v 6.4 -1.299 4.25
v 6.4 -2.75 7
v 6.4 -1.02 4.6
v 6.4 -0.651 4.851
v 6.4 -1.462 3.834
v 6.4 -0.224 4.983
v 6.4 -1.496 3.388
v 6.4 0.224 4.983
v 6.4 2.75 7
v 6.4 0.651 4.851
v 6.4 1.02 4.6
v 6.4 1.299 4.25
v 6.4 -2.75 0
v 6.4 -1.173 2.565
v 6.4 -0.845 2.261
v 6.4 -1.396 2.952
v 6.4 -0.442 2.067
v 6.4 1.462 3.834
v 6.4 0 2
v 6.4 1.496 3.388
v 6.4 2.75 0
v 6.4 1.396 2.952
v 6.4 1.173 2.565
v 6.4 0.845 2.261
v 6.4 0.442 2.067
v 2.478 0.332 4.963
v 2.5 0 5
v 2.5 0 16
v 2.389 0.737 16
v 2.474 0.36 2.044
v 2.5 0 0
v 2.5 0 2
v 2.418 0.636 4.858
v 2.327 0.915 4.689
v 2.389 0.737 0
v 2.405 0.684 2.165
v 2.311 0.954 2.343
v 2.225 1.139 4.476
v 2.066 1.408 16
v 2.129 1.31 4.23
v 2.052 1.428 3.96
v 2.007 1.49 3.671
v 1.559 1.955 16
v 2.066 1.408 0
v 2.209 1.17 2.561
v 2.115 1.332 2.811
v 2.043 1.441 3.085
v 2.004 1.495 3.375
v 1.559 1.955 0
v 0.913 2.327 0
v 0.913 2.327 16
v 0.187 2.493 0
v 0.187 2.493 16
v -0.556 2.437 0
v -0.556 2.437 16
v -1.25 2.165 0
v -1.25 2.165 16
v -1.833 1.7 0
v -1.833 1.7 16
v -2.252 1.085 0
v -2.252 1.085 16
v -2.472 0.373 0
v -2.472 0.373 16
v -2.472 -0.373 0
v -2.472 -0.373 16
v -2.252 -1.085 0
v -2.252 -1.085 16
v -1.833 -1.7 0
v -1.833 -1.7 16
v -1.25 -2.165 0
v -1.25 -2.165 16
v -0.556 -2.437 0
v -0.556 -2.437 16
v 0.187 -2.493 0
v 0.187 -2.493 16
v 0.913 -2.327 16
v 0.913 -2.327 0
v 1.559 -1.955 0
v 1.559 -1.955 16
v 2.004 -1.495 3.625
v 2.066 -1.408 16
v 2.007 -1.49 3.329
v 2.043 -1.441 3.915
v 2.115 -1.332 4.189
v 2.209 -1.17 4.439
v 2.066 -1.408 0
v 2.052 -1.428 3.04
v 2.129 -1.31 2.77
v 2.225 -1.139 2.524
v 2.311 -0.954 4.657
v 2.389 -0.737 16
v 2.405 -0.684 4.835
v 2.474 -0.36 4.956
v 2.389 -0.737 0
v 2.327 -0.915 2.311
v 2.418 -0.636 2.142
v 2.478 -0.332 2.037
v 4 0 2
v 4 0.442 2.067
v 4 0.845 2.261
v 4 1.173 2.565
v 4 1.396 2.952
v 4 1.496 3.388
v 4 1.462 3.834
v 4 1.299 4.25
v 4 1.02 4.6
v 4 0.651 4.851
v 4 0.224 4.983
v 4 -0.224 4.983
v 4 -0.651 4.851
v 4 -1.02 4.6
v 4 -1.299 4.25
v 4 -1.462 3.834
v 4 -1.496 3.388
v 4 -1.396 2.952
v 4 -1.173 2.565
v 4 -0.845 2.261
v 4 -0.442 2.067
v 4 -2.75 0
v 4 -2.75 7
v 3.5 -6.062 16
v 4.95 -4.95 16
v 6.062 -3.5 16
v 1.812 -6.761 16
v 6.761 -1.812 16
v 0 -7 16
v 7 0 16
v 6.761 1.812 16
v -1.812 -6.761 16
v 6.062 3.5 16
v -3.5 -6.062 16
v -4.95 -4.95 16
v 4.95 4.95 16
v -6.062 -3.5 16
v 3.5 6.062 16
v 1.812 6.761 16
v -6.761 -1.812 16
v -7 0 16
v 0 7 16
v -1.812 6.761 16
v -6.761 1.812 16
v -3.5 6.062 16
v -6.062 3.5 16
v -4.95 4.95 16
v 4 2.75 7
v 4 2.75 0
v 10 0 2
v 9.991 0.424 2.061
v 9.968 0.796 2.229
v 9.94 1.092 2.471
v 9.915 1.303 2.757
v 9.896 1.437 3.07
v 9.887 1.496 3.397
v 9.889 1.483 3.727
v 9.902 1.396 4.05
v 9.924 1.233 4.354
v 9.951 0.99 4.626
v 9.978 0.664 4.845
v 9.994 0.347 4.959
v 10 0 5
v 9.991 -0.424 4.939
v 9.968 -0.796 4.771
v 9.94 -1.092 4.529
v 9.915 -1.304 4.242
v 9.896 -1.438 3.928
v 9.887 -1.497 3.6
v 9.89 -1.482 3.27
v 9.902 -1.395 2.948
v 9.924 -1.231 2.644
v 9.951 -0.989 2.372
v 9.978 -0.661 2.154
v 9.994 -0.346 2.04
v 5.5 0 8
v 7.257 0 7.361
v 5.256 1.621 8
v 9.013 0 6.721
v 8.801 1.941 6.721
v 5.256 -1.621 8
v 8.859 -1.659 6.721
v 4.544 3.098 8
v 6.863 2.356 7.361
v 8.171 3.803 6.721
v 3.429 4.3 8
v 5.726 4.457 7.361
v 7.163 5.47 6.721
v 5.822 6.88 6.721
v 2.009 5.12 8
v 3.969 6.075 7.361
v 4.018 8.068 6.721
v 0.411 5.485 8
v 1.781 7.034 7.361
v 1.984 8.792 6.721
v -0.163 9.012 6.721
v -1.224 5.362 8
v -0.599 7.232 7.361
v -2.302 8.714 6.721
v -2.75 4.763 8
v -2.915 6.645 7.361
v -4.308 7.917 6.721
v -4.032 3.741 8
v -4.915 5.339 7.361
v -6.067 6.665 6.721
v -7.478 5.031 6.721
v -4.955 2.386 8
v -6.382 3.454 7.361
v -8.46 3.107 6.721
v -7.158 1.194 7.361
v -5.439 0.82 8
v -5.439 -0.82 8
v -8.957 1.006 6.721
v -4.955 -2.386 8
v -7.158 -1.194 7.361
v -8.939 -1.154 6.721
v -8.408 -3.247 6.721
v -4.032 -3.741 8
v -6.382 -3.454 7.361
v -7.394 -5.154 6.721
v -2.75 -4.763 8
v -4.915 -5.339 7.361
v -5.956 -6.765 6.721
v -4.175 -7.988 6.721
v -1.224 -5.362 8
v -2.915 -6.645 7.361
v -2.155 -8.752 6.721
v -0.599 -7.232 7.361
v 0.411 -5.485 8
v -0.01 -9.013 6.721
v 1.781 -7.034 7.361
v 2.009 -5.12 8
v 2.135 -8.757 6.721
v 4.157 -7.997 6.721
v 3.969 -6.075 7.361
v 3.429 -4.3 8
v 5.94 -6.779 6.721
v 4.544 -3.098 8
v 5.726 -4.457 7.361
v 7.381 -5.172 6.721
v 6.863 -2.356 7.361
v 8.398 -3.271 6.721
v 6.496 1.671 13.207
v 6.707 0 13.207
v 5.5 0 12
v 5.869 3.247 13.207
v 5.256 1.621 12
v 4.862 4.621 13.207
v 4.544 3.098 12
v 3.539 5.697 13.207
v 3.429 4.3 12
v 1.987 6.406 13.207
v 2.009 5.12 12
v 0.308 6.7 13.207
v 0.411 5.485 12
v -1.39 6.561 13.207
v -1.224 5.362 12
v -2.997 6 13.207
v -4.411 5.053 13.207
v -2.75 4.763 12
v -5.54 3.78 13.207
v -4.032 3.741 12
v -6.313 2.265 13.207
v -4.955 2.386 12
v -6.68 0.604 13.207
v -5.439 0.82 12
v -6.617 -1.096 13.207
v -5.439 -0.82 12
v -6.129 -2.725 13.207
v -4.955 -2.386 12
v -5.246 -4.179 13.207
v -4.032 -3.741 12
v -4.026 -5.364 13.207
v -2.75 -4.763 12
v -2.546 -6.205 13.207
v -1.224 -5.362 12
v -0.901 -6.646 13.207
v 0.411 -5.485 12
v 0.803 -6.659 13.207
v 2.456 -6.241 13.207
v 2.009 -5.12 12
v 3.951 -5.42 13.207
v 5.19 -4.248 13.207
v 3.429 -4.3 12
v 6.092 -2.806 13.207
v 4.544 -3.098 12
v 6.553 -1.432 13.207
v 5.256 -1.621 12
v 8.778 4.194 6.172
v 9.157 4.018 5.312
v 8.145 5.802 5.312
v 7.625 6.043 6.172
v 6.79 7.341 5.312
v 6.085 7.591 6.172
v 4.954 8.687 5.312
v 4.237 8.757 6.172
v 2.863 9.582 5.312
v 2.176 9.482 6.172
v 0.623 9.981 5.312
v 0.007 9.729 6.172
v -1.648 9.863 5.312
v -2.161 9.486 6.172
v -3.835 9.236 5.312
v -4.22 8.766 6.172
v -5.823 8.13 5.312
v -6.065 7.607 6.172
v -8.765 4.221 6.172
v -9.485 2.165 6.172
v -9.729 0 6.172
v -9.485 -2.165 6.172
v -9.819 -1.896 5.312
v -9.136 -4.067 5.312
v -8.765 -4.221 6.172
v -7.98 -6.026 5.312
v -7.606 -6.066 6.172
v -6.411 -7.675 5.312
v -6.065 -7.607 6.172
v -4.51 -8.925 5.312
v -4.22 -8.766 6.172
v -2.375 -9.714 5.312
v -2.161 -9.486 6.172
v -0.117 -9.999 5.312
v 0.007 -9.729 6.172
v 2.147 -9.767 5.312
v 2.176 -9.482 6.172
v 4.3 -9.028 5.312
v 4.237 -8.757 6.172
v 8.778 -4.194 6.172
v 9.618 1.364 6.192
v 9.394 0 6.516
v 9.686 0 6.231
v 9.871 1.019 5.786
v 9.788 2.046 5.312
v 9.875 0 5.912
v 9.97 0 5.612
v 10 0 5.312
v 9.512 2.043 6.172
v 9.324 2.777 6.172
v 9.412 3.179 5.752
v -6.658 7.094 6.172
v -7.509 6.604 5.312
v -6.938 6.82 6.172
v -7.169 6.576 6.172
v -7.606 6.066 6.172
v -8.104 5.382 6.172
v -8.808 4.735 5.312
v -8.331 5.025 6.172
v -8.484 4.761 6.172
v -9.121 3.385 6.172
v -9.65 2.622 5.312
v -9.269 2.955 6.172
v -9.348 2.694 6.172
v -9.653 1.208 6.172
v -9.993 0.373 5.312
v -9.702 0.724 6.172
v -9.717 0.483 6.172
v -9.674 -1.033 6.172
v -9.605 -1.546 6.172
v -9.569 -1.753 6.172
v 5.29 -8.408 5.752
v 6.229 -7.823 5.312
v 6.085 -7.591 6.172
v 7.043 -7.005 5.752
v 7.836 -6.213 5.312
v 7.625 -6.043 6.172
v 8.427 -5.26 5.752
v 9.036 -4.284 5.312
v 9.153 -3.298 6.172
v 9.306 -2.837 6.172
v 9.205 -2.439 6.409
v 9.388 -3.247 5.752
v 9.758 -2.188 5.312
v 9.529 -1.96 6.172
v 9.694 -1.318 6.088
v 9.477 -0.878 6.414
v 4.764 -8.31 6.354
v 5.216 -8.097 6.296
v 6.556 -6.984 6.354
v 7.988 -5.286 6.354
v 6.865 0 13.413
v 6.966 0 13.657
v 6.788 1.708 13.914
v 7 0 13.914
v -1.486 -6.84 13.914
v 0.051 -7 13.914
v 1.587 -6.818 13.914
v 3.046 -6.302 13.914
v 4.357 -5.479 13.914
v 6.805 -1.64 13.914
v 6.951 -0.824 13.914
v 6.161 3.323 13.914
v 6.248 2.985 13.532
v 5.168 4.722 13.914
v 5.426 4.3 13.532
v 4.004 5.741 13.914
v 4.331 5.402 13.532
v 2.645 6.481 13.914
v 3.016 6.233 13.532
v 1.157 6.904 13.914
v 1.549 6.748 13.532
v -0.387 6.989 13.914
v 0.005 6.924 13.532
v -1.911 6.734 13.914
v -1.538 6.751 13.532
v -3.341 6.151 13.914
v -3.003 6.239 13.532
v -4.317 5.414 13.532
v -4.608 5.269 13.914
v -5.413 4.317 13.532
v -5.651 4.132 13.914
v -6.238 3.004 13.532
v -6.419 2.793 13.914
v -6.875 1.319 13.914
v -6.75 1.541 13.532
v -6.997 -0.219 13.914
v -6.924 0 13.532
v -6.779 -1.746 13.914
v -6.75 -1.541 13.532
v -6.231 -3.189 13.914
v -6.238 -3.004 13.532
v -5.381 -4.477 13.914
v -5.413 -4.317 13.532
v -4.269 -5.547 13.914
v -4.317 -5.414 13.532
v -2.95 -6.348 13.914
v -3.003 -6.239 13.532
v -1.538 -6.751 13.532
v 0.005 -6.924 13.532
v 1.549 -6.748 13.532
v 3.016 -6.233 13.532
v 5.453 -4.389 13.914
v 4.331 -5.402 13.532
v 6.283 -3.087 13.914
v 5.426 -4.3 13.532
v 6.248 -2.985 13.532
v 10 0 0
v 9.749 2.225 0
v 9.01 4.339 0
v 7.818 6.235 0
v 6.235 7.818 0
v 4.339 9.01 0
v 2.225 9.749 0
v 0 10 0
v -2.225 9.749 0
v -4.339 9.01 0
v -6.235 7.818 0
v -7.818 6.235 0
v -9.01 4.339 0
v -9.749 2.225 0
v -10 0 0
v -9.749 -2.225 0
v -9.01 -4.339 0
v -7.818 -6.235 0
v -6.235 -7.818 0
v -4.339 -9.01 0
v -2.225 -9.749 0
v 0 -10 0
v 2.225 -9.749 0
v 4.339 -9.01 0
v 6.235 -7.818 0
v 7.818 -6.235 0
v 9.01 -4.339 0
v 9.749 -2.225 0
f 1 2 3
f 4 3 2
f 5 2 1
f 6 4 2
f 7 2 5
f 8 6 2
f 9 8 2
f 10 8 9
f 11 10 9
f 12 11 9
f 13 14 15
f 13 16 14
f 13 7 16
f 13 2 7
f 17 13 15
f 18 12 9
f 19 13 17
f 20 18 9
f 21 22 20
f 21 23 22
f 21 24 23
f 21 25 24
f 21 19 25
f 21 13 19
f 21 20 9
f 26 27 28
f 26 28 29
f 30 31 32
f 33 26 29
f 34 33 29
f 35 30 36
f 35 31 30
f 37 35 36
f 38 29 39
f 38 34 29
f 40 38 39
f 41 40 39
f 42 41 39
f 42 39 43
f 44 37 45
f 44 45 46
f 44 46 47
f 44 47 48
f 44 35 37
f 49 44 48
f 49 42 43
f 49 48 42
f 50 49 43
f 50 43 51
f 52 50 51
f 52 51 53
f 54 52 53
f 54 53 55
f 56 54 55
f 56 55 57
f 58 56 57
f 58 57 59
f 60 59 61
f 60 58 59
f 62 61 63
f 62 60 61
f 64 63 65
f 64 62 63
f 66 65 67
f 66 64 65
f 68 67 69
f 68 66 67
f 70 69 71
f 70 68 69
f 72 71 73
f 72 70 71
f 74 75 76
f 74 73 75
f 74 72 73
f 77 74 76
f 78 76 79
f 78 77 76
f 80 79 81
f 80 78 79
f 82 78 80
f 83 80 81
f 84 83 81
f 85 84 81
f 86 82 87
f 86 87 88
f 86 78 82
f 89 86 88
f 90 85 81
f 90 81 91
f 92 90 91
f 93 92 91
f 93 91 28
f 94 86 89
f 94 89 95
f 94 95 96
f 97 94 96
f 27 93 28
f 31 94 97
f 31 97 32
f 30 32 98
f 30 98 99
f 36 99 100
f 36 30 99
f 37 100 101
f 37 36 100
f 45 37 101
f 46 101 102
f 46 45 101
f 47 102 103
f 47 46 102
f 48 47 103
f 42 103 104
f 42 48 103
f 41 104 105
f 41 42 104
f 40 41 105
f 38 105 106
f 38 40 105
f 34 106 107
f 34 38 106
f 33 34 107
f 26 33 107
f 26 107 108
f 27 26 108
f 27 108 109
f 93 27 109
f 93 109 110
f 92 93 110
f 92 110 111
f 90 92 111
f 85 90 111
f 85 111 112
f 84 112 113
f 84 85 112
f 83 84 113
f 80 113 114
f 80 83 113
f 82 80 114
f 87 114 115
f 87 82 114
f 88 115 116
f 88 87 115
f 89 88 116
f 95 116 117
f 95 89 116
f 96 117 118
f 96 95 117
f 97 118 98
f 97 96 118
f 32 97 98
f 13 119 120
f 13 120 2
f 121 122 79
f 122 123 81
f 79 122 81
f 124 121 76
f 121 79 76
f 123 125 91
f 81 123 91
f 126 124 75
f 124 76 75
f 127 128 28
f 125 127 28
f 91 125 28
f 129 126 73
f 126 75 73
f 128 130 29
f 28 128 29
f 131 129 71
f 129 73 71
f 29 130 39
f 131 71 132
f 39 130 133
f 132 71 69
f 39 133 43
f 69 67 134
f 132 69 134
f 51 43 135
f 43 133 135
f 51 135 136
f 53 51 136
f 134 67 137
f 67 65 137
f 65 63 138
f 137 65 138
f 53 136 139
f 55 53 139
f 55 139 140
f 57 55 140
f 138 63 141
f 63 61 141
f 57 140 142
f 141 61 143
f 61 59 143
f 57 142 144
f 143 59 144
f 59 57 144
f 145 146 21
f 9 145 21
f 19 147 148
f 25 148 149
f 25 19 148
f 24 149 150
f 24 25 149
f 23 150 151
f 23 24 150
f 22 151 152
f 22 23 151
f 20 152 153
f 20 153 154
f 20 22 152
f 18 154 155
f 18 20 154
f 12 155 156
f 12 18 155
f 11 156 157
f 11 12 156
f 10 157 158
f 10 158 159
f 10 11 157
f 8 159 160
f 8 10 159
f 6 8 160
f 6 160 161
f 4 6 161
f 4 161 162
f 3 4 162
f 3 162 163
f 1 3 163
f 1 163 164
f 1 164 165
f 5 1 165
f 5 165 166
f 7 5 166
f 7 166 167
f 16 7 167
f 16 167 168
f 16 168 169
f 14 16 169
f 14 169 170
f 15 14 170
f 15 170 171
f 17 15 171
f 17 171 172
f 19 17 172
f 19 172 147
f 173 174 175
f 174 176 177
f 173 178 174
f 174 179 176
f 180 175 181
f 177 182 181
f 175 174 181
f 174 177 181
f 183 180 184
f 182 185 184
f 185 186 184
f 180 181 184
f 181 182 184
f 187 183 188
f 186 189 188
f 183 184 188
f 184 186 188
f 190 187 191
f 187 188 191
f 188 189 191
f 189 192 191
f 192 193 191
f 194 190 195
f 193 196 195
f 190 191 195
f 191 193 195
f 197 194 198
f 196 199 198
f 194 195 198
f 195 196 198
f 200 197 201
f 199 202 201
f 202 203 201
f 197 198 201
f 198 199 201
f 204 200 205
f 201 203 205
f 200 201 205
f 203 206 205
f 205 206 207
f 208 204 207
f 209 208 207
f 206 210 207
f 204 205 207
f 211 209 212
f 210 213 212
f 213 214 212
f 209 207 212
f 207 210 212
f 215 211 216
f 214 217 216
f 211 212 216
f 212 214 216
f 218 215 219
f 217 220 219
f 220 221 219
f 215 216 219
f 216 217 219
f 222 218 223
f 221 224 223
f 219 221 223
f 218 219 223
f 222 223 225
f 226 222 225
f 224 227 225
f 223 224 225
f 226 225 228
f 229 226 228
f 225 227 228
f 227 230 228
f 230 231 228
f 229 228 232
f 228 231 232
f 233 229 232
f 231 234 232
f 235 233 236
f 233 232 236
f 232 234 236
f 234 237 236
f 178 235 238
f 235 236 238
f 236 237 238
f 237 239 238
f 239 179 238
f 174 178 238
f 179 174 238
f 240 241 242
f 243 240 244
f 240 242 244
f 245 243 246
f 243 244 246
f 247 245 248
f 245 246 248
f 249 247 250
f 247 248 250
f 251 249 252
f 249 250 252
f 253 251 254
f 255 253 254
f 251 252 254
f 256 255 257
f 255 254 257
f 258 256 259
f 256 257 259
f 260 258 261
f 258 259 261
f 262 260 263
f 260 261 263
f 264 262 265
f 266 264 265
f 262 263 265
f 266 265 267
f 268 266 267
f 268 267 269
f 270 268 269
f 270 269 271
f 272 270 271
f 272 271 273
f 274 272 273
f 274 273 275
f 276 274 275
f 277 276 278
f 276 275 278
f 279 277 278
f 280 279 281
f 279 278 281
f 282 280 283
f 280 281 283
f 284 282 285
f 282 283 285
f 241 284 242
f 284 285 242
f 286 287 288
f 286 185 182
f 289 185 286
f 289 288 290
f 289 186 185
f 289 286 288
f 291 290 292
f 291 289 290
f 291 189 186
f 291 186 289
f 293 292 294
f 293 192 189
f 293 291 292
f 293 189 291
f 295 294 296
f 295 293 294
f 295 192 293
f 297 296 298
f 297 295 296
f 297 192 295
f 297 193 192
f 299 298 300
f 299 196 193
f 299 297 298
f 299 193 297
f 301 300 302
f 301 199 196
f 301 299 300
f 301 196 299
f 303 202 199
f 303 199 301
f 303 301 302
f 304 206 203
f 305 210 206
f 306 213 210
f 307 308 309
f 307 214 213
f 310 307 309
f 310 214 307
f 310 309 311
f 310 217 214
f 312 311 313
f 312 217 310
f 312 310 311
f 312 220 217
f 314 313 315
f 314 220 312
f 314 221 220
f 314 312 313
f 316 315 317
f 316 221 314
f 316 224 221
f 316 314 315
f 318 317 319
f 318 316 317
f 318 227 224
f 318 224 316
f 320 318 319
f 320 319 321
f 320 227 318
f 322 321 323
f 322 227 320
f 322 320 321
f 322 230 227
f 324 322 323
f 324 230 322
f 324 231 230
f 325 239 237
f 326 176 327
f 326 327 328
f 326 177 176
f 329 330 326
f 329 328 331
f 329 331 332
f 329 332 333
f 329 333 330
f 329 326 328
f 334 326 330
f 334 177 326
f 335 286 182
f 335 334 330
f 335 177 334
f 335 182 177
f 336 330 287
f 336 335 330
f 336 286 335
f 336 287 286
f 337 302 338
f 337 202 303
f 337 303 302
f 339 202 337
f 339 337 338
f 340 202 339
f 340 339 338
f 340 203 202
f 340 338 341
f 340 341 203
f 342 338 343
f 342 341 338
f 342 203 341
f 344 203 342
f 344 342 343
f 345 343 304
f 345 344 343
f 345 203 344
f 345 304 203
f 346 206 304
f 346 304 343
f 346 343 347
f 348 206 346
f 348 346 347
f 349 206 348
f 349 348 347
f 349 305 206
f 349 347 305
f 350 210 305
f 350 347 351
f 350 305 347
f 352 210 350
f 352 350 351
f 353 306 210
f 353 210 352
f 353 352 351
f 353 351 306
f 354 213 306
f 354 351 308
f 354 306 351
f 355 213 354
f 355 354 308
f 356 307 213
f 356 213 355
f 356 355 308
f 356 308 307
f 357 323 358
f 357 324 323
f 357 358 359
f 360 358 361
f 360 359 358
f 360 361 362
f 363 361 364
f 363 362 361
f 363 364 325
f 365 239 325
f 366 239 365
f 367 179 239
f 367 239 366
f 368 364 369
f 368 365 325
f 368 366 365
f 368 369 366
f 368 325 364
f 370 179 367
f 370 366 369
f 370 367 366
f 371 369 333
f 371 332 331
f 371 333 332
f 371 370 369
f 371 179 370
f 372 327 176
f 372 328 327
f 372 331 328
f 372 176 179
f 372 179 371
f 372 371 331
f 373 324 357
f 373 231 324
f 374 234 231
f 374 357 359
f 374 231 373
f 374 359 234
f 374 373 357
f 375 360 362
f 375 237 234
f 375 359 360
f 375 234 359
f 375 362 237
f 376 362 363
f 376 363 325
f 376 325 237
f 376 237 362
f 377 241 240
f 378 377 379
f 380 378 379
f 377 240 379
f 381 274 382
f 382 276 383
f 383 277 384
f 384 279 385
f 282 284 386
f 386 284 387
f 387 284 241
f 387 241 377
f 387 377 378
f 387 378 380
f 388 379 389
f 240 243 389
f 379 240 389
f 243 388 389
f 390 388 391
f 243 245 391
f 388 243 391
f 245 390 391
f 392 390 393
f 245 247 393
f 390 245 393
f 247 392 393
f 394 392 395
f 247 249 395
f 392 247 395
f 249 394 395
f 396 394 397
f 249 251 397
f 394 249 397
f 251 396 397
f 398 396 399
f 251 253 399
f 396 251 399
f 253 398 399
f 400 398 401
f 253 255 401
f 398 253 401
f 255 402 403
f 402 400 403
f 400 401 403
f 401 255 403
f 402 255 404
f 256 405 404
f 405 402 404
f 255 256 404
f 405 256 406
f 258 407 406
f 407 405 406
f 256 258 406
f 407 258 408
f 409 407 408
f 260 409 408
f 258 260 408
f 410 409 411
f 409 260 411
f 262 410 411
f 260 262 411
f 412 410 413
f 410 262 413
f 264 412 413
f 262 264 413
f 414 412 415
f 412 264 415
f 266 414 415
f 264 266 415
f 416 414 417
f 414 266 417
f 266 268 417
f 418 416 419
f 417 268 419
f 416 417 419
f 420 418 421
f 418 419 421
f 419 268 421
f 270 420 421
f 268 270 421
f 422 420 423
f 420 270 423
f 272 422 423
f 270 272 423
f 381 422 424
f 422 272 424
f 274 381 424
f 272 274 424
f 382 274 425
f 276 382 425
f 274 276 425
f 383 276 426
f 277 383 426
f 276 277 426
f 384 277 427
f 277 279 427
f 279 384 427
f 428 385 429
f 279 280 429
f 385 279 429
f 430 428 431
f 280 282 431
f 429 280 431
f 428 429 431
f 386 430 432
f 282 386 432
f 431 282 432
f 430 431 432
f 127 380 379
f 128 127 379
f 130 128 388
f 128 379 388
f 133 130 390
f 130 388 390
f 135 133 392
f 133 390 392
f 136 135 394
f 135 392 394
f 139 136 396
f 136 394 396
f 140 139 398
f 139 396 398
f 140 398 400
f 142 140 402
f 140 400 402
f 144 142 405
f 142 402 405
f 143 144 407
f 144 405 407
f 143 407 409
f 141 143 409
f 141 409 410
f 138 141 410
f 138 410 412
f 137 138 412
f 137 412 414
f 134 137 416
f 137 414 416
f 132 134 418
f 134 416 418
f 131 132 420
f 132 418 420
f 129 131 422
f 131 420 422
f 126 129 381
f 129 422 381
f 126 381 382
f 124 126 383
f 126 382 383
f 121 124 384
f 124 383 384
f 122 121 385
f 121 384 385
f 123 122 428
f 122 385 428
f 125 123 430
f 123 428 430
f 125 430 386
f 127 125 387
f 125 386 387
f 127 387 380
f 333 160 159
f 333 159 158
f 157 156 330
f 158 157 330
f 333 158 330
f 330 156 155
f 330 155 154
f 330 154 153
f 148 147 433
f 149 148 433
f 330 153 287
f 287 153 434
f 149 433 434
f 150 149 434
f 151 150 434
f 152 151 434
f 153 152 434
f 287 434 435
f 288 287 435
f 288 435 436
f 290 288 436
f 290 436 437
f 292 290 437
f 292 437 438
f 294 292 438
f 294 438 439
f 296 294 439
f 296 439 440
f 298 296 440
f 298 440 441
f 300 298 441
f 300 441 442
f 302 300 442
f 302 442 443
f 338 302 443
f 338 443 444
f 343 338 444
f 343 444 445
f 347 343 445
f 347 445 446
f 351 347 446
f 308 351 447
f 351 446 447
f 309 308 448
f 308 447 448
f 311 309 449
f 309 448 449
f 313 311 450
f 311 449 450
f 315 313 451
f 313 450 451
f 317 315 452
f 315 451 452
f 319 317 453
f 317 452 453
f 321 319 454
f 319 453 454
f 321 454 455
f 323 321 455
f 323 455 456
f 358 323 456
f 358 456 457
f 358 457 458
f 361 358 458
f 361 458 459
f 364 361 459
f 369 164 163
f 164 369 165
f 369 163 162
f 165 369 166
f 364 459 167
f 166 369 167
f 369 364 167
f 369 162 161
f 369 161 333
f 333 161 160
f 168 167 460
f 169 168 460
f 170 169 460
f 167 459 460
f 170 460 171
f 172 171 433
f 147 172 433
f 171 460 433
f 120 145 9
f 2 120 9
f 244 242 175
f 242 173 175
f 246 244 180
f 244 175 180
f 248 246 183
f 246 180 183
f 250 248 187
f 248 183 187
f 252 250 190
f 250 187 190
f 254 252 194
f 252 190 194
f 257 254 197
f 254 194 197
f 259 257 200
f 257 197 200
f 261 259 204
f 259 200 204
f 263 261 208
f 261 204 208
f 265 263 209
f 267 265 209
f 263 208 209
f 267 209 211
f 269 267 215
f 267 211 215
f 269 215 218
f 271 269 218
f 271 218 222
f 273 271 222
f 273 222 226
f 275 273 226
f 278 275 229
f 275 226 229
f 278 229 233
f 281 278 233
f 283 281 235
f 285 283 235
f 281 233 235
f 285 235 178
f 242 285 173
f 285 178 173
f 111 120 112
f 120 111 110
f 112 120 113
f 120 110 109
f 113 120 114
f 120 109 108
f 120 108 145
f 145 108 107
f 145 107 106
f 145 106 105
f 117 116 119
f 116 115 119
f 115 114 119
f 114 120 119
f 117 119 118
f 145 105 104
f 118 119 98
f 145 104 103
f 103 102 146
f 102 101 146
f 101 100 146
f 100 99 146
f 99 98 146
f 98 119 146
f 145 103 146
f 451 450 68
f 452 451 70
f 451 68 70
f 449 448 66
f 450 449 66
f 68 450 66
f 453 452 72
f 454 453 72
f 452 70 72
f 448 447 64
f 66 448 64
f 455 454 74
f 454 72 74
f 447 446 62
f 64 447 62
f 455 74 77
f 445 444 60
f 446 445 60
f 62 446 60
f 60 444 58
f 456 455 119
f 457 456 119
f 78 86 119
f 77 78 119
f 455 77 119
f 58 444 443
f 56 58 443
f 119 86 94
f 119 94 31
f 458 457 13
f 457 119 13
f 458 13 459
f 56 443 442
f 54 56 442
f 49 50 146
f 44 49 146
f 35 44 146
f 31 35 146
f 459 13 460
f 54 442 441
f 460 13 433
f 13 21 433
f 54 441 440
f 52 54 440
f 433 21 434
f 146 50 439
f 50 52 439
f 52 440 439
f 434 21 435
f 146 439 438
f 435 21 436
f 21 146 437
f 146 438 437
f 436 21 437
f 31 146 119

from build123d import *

# Parameters (mm, degrees)
CYLINDER002_R           = 1.5
CYLINDER002_DEPTH       = 20
CYLINDER002_PITCH_ANGLE = 90
CYLINDER001_R           = 2.5
CYLINDER001_DEPTH       = 30
BOX_W                   = 2.4
BOX_H                   = 5.5
BOX_DEPTH               = 20
FILLET_1_R              = 1.5
FILLET_2_R              = 1


with BuildPart() as clone_of_bolt:
    # Cylinder002 → Cylinder002 (new body)
    with BuildSketch(Plane.XY):
        Circle(CYLINDER002_R)
    extrude(amount=CYLINDER002_DEPTH)


with BuildPart() as clone_of_bolt_1:
    # Cylinder002 pitch: moved
    add(clone_of_bolt.part.rotate(Axis((0, 0, 0), (0, 1, 0)), CYLINDER002_PITCH_ANGLE))


with BuildPart() as clone_of_bolt_2:
    # Cylinder002 placement: moved
    add(clone_of_bolt_1.part.moved(Location((0, 0, 3.5))))


with BuildPart() as clone_of_nemashaft:
    # Cylinder001 → Cylinder001 (new body)
    with BuildSketch(Plane.XY.offset(-8)):
        Circle(CYLINDER001_R)
    extrude(amount=CYLINDER001_DEPTH)


with BuildPart() as innercavity:
    # Box → Box (new body)
    with BuildSketch(Plane(origin=(4, -2.75, -13), x_dir=(1, 0, 0), z_dir=(0, 0, 1))):
        with Locations((1.2, 2.75)):
            Rectangle(BOX_W, BOX_H)
    extrude(amount=BOX_DEPTH)

    # Fusion: union Clone of Bolt, Clone of NEMAShaft
    add(clone_of_bolt_2.part)
    add(clone_of_nemashaft.part)


with BuildPart() as innercavitycut:
    # Sketch001 → Revolution (revolve)
    with BuildSketch(Plane.XZ):
        Polygon((0, 16), (7, 16), (7, 13.5), (5.5, 12), (5.5, 8), (10, 6.362134), (10, 0), (0, 0), align=None)
    revolve(axis=Axis((0, 0, 0), (0, 0, 1)))

    # Fillet 1
    fillet_1_edges = [innercavitycut.edges().sort_by_distance(p)[0] for p in [
        (-10, 0, 6.362134),
    ]]
    fillet(fillet_1_edges, radius=FILLET_1_R)

    # Fillet 2
    fillet_2_edges = [innercavitycut.edges().sort_by_distance(p)[0] for p in [
        (-7, 0, 13.5),
    ]]
    fillet(fillet_2_edges, radius=FILLET_2_R)

    # Cut: cut InnerCavity
    add(innercavity.part, mode=Mode.SUBTRACT)


solid = innercavitycut.part
